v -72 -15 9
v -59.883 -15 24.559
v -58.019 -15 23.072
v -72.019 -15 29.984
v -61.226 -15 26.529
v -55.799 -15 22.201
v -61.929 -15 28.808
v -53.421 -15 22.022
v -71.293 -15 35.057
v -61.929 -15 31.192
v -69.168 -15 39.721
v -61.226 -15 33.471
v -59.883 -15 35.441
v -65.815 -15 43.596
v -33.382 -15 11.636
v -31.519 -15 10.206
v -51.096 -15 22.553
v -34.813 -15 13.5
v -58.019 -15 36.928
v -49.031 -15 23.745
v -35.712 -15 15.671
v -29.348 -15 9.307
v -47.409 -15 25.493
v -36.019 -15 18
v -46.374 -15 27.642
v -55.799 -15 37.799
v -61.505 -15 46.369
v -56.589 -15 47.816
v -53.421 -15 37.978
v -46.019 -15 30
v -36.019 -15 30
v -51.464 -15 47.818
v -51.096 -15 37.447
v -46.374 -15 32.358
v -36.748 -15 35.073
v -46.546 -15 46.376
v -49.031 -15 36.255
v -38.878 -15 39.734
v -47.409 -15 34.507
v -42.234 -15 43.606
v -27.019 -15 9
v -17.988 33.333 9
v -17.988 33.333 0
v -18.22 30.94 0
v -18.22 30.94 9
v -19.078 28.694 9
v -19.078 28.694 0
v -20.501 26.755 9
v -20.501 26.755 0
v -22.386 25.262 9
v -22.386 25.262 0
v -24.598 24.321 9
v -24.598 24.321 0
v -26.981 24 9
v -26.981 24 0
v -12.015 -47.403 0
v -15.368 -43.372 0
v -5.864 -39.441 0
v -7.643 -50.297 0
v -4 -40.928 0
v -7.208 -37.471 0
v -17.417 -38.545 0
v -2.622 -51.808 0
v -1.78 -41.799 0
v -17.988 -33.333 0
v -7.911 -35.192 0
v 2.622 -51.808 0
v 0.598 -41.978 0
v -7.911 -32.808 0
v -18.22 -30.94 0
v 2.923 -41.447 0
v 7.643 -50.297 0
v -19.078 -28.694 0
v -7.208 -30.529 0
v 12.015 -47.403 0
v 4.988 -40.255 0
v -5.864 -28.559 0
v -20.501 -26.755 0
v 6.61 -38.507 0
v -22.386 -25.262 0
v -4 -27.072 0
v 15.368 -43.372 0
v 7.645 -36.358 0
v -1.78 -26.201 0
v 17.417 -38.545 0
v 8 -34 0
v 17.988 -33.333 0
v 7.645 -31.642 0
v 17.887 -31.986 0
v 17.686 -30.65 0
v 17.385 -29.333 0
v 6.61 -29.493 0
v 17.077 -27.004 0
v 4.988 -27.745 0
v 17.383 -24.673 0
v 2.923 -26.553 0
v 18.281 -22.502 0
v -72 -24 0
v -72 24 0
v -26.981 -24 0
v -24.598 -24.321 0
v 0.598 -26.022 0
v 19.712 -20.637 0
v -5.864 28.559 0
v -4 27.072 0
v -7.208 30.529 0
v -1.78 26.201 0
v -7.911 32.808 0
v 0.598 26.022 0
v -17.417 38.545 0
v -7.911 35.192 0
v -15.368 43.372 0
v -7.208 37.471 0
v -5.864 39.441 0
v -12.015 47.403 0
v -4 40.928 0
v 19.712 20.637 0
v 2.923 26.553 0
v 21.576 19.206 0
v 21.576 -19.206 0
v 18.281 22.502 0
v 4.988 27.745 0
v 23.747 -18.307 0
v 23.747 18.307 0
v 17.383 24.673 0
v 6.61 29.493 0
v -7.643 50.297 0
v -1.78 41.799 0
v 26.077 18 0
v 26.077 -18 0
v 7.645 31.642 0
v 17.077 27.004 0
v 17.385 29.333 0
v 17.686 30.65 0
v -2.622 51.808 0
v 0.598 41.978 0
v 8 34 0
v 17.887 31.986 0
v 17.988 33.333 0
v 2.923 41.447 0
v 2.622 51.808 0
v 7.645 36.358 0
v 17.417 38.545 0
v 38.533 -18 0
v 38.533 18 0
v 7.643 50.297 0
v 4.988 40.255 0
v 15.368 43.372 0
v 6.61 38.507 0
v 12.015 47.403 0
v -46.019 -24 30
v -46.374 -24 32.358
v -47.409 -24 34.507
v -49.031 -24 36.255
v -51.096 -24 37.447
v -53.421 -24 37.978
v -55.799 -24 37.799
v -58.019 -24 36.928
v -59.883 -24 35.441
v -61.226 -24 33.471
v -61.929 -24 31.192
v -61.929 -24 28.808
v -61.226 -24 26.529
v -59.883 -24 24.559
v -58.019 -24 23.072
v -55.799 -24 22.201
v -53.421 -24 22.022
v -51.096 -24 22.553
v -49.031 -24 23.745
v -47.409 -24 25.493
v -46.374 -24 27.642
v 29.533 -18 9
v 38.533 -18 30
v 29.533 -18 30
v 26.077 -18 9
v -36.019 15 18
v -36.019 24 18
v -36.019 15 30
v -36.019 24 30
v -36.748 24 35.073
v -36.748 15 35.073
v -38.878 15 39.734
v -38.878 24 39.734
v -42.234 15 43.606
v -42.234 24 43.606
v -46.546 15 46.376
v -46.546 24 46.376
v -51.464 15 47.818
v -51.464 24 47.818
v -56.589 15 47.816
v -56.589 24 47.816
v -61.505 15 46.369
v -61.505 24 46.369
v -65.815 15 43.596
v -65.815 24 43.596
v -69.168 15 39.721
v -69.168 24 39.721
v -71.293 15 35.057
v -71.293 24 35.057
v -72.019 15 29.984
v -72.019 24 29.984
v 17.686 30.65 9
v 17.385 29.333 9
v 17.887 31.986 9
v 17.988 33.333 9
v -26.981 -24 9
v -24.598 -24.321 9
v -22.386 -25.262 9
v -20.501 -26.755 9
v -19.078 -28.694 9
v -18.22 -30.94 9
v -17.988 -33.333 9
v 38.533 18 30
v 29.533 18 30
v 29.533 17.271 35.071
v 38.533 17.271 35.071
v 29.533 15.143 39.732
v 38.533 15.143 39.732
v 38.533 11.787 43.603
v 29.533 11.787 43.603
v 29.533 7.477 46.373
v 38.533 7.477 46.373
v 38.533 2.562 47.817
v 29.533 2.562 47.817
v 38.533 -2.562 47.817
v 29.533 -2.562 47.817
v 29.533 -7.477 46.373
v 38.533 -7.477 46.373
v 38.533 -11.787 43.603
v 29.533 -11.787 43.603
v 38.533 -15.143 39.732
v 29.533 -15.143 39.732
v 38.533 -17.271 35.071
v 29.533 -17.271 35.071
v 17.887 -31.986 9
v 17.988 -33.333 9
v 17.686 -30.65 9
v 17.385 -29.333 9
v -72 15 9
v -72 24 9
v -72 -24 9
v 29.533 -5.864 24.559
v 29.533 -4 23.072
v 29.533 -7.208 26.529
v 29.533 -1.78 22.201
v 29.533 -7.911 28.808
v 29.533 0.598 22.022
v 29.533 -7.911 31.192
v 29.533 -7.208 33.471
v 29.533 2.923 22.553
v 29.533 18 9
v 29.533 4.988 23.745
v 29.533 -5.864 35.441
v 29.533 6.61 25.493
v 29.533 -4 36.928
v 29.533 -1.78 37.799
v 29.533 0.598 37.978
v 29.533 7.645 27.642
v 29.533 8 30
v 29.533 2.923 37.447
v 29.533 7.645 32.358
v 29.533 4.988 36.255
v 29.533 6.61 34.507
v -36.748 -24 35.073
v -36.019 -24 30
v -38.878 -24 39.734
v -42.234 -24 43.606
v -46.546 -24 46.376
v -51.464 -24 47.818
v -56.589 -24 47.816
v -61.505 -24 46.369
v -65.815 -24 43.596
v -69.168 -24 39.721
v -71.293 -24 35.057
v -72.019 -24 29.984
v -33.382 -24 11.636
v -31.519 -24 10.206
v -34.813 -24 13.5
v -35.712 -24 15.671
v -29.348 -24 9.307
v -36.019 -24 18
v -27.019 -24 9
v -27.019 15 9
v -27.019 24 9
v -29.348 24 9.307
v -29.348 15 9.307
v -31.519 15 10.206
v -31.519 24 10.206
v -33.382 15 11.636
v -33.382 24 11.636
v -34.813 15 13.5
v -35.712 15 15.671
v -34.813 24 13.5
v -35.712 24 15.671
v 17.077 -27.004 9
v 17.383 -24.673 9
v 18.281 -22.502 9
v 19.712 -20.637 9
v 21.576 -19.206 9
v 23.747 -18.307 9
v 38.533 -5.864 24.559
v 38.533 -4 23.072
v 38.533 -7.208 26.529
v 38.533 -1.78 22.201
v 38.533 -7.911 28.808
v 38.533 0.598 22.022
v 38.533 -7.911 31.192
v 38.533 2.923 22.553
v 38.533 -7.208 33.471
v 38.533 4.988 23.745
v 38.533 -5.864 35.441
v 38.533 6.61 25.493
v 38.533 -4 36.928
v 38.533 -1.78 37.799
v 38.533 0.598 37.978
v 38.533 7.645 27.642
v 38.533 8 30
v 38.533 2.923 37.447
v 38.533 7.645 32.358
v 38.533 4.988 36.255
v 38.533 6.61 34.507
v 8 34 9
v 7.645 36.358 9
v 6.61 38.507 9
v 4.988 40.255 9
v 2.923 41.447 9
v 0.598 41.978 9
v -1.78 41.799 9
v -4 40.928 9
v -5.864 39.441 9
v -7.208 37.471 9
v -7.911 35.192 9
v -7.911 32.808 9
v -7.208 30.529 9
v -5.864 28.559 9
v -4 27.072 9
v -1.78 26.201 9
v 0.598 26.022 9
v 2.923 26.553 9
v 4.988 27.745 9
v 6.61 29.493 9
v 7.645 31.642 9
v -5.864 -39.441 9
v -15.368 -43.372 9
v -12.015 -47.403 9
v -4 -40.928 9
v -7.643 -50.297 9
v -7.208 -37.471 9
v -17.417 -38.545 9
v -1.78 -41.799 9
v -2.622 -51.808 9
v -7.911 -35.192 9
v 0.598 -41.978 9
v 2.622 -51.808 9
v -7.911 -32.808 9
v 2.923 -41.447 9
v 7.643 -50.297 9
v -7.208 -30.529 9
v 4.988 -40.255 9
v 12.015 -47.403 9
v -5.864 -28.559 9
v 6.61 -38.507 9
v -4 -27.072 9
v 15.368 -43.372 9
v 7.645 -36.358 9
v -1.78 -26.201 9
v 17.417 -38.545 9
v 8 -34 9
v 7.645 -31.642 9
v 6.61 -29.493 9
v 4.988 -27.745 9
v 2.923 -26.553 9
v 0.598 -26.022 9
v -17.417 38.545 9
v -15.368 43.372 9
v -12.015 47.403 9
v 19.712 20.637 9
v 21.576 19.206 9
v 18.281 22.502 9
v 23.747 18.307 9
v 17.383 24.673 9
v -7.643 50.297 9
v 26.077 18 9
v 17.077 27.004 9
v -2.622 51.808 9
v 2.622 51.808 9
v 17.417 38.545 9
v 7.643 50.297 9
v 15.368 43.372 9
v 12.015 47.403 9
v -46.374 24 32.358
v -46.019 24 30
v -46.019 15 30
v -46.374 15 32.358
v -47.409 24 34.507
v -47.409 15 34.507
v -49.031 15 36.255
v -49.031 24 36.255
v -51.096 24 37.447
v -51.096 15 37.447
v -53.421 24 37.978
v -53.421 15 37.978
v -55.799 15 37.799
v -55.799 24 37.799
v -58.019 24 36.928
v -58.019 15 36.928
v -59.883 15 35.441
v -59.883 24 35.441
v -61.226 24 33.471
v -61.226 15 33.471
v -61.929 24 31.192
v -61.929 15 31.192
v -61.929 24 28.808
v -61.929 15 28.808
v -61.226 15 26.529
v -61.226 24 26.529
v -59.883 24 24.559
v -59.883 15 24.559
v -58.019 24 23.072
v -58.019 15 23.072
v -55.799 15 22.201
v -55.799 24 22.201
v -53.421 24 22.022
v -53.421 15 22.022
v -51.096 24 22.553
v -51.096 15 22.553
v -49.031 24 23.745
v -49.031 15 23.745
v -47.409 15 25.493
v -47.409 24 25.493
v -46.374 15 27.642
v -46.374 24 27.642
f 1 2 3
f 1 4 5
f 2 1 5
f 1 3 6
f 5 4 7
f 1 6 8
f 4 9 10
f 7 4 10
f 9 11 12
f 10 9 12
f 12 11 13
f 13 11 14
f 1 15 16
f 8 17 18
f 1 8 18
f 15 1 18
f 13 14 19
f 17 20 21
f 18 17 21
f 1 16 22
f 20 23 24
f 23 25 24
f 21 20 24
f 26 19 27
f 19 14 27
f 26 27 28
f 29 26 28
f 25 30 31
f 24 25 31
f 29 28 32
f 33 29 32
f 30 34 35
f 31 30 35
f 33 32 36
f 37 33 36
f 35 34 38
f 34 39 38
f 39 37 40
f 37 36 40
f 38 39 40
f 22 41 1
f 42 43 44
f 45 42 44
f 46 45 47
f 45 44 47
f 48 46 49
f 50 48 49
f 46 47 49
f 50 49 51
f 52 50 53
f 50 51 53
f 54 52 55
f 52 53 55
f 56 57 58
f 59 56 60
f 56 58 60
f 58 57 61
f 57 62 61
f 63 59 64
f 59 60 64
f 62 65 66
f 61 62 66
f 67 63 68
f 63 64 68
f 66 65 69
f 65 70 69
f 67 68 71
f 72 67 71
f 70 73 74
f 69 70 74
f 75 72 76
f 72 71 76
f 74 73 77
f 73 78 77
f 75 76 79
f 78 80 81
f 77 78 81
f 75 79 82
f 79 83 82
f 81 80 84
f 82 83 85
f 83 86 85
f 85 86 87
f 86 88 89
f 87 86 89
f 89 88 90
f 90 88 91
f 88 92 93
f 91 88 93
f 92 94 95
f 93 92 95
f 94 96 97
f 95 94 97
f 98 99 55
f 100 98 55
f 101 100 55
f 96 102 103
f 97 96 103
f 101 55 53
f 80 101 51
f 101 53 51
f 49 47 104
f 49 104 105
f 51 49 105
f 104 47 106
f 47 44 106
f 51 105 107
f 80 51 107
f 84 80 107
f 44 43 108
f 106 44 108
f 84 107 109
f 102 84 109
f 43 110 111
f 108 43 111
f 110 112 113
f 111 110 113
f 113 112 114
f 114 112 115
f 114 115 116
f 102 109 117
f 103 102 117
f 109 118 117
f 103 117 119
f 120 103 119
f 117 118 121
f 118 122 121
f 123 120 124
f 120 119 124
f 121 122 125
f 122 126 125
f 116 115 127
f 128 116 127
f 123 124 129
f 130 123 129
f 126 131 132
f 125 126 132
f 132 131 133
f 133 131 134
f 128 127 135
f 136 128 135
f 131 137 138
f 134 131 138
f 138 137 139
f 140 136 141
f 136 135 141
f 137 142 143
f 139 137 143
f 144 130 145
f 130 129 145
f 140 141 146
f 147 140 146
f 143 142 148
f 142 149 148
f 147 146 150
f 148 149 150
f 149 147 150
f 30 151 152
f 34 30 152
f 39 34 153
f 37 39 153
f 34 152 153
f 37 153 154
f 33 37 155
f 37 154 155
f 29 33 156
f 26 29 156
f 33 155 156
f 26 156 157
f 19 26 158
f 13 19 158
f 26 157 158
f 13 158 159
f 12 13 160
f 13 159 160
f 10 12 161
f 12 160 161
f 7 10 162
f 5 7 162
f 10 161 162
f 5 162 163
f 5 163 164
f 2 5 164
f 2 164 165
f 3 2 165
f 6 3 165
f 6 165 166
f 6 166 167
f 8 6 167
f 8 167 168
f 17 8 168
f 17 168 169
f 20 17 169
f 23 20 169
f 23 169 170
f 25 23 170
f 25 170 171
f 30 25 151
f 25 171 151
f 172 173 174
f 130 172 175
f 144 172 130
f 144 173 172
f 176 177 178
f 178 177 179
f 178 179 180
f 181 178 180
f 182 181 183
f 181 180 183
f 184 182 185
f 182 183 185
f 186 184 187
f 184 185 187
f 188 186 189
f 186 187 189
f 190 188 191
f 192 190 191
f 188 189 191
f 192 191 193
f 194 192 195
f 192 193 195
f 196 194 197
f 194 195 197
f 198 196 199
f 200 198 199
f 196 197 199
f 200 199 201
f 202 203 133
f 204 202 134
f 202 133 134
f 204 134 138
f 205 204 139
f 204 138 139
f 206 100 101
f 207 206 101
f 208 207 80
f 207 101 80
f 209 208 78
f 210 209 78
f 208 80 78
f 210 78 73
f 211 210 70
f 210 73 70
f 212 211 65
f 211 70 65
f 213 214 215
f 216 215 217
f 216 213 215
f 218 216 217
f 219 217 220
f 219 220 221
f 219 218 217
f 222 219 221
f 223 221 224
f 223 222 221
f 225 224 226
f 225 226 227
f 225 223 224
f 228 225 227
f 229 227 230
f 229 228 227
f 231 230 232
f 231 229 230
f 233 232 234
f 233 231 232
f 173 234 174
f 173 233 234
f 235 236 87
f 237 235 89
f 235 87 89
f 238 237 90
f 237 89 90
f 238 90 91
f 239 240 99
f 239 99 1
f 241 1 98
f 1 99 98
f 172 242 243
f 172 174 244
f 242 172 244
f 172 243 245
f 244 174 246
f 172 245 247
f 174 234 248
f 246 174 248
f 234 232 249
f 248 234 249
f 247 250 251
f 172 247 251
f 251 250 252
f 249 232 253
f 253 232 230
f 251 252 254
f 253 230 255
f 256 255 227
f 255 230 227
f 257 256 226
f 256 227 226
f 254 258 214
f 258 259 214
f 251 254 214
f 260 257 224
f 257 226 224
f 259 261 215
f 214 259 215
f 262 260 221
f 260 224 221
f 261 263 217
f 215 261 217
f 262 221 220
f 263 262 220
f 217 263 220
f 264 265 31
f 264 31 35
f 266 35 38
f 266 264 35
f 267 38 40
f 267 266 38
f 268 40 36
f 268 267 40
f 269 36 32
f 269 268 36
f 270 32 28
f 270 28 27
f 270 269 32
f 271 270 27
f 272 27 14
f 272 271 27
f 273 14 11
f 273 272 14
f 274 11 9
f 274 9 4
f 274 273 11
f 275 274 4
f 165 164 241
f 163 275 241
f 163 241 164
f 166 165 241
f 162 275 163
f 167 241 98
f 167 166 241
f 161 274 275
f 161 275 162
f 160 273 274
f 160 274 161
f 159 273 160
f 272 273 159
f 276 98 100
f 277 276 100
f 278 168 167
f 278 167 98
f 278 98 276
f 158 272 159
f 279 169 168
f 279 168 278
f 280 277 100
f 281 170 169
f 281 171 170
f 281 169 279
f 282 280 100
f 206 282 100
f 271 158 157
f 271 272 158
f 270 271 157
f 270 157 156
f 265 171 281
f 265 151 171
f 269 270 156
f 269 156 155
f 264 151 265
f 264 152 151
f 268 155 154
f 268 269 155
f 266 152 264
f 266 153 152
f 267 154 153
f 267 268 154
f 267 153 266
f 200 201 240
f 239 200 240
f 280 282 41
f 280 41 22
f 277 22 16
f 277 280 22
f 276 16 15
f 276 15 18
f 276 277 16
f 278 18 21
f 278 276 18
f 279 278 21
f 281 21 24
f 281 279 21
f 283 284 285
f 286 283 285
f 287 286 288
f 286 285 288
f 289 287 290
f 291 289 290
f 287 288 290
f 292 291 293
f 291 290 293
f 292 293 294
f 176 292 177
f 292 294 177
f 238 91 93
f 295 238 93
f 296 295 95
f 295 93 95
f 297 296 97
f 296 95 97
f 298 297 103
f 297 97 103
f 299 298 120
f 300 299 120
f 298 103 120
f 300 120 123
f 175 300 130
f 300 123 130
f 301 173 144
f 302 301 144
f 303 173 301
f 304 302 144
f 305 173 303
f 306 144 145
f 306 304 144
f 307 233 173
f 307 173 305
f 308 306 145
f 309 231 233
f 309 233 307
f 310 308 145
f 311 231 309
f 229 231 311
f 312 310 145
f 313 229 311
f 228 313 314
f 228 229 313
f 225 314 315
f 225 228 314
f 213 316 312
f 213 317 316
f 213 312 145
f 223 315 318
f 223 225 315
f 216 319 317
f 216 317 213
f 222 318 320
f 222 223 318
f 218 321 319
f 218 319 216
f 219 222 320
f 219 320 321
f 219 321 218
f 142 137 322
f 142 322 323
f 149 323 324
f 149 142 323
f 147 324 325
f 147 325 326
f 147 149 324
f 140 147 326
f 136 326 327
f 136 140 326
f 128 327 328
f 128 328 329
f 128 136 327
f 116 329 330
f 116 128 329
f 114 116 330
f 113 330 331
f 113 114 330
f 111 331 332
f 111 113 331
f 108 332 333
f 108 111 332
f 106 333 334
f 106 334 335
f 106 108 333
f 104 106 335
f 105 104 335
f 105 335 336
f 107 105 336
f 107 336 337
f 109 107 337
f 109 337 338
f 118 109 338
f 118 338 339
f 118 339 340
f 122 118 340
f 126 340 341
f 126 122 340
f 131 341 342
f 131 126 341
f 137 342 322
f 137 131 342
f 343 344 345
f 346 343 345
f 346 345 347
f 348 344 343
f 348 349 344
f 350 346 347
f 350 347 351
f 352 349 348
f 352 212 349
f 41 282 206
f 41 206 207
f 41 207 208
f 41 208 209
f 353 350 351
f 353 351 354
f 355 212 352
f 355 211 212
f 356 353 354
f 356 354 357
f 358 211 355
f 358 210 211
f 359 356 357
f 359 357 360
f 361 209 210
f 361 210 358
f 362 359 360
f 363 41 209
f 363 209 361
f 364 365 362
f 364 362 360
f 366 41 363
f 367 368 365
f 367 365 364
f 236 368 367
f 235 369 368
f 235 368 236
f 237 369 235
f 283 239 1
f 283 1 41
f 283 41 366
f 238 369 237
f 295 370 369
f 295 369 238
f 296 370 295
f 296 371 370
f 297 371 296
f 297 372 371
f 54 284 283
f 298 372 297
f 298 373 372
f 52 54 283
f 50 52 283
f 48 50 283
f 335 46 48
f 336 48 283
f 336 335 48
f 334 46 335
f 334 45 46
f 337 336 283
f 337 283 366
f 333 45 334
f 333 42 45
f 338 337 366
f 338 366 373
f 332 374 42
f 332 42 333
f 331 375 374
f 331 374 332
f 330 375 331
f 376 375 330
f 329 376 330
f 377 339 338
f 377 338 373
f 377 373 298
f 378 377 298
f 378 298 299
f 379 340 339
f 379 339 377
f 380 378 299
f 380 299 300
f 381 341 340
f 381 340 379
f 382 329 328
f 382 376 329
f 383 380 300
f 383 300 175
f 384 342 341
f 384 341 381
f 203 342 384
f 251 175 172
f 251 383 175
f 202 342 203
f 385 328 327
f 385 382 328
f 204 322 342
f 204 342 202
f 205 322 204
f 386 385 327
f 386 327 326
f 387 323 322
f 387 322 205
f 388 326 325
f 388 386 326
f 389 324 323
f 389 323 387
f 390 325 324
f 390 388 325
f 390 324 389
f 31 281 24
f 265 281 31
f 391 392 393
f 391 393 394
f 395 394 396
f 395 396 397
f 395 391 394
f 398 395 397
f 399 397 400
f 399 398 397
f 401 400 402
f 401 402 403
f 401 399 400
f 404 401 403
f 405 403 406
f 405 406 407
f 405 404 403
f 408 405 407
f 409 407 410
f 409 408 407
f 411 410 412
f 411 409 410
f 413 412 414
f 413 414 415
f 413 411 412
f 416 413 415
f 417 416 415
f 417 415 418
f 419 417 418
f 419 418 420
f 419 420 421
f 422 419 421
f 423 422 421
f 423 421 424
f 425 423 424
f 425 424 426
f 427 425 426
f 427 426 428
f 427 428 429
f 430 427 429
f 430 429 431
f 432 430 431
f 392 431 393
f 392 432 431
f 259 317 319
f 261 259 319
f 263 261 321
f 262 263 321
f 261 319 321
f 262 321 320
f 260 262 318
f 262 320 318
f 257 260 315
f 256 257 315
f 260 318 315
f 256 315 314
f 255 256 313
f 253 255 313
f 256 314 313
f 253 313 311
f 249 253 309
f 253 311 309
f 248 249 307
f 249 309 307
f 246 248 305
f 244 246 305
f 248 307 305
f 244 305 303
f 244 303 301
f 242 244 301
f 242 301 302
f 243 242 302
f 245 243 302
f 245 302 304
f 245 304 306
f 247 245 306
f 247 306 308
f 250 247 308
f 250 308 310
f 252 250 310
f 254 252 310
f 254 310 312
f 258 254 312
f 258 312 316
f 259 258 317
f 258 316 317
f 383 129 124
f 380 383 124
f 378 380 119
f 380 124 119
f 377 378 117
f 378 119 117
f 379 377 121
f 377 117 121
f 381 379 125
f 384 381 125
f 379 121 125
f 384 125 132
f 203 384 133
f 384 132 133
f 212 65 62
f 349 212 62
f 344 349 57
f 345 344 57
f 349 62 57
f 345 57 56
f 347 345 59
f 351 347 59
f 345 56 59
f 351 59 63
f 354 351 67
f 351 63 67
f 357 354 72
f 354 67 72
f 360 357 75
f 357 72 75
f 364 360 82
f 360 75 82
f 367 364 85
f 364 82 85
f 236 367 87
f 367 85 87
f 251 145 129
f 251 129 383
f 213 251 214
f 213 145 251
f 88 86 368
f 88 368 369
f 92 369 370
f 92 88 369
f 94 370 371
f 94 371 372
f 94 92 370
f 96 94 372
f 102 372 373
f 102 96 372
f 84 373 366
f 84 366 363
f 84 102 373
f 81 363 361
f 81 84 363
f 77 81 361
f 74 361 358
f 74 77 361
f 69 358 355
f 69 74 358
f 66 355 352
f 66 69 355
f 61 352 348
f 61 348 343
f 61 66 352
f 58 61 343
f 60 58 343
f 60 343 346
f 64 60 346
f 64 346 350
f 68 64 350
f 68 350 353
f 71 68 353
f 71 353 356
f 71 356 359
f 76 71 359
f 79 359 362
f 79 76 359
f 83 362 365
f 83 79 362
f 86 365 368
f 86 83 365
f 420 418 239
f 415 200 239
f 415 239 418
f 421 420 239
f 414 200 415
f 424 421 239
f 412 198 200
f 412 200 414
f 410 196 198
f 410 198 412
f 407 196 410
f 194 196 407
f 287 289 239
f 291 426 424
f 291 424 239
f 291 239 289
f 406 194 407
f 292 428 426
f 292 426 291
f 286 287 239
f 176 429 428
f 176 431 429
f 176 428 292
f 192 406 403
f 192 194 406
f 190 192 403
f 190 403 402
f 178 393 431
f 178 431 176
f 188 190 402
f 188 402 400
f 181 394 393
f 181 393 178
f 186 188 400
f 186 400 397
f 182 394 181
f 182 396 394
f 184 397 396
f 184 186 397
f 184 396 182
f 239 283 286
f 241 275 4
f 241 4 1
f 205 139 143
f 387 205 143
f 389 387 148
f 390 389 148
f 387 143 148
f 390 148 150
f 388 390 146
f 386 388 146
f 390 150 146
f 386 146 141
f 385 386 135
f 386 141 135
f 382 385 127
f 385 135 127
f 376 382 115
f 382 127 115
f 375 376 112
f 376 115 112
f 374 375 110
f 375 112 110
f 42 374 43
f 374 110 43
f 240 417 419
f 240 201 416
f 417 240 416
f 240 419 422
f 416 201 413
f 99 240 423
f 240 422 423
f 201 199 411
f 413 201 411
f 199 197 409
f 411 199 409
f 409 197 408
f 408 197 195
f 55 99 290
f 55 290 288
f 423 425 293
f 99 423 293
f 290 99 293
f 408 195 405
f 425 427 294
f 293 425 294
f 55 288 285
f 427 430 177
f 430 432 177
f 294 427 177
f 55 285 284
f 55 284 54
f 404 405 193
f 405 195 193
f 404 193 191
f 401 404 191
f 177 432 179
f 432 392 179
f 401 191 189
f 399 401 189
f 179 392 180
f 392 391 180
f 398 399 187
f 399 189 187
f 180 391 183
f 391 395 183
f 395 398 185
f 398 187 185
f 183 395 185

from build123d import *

# Parameters (mm, degrees)
F0_R     = 8
F1_DEPTH = 9
F3_DEPTH = 9
F4_R     = 8
F5_DEPTH = 9
F7_DEPTH = 9
F8_R     = 8
F9_DEPTH = 9


# Not quite as in the source:
# - a pattern or mirror of a feature is missing from the dataset's text; its kind, count and spacing are read off the source's solid


with BuildPart() as f1:
    # F0 (on Top) → F1 (new body)
    with BuildSketch(Plane.XY):
        with BuildLine():
            ThreePointArc((17.3845397472, 29.3333333333), (17.7988188757, 31.316337087), (17.9876500843, 33.3333333333))
            ThreePointArc((17.9876500843, 33.3333333333), (0, 52), (-17.9876500843, 33.3333333333))
            ThreePointArc((-17.9876500843, 33.3333333333), (-20.5007344281, 26.7550020016), (-26.9814751265, 24))
            Line((-26.9814751265, 24), (-72, 24))
            Line((-72, 24), (-72, -24))
            Line((-72, -24), (-26.9814751265, -24))
            ThreePointArc((-26.9814751265, -24), (-20.5007344281, -26.7550020016), (-17.9876500843, -33.3333333333))
            ThreePointArc((-17.9876500843, -33.3333333333), (0, -52), (17.9876500843, -33.3333333333))
            ThreePointArc((17.9876500843, -33.3333333333), (17.7988188757, -31.316337087), (17.3845397472, -29.3333333333))
            ThreePointArc((17.3845397472, -29.3333333333), (18.9353811923, -21.5227744249), (26.0768096208, -18))
            Line((26.0768096208, -18), (38.5327786207, -18))
            Line((38.5327786207, -18), (38.5327786207, 18))
            Line((38.5327786207, 18), (26.0768096208, 18))
            ThreePointArc((26.0768096208, 18), (18.9353811923, 21.5227744249), (17.3845397472, 29.3333333333))
        make_face()
        with Locations((0, -34)):
            Circle(F0_R, mode=Mode.SUBTRACT)
        with Locations((0, 34)):
            Circle(F0_R, mode=Mode.SUBTRACT)
    extrude(amount=F1_DEPTH)

    # F2 (on face) → F3 (join)
    with BuildSketch(Plane.XZ.offset(24)):
        with BuildLine():
            Line((-36.0185248735, 18), (-36.0185248735, 30))
            ThreePointArc((-36.0185248735, 30), (-54.0264671065, 47.9999982478), (-72.0185178648, 29.9841155356))
            Line((-72.0185178648, 29.9841155356), (-72, 9))
            Line((-72, 9), (-27.0185248735, 9))
            ThreePointArc((-27.0185248735, 9), (-33.3824859042, 11.6360389693), (-36.0185248735, 18))
        make_face()
    f3 = extrude(amount=-F3_DEPTH)

    # F3_copies: F3 across plane
    add(f3.mirror(Plane.ZX))

    # F4 (on face) → F5 (cut, through all)
    with BuildSketch(Plane.XZ.offset(24)):
        with Locations((-54.0185248735, 30)):
            Circle(F4_R)
    f5 = extrude(amount=-F5_DEPTH, mode=Mode.SUBTRACT)

    # F5_copies: F5 across plane
    add(f5.mirror(Plane.ZX), mode=Mode.SUBTRACT)

    # F6 (on face) → F7 (join)
    with BuildSketch(Plane.YZ.offset(38.5327786207)):
        with BuildLine():
            Line((18, 9), (18, 30))
            ThreePointArc((18, 30), (0, 48), (-18, 30))
            Line((-18, 30), (-18, 9))
            Line((-18, 9), (18, 9))
        make_face()
    extrude(amount=-F7_DEPTH)

    # F8 (on face) → F9 (cut, through all)
    with BuildSketch(Plane.YZ.offset(38.5327786207)):
        with Locations((0, 30)):
            Circle(F8_R)
    extrude(amount=-F9_DEPTH, mode=Mode.SUBTRACT)


solid = f1.part
